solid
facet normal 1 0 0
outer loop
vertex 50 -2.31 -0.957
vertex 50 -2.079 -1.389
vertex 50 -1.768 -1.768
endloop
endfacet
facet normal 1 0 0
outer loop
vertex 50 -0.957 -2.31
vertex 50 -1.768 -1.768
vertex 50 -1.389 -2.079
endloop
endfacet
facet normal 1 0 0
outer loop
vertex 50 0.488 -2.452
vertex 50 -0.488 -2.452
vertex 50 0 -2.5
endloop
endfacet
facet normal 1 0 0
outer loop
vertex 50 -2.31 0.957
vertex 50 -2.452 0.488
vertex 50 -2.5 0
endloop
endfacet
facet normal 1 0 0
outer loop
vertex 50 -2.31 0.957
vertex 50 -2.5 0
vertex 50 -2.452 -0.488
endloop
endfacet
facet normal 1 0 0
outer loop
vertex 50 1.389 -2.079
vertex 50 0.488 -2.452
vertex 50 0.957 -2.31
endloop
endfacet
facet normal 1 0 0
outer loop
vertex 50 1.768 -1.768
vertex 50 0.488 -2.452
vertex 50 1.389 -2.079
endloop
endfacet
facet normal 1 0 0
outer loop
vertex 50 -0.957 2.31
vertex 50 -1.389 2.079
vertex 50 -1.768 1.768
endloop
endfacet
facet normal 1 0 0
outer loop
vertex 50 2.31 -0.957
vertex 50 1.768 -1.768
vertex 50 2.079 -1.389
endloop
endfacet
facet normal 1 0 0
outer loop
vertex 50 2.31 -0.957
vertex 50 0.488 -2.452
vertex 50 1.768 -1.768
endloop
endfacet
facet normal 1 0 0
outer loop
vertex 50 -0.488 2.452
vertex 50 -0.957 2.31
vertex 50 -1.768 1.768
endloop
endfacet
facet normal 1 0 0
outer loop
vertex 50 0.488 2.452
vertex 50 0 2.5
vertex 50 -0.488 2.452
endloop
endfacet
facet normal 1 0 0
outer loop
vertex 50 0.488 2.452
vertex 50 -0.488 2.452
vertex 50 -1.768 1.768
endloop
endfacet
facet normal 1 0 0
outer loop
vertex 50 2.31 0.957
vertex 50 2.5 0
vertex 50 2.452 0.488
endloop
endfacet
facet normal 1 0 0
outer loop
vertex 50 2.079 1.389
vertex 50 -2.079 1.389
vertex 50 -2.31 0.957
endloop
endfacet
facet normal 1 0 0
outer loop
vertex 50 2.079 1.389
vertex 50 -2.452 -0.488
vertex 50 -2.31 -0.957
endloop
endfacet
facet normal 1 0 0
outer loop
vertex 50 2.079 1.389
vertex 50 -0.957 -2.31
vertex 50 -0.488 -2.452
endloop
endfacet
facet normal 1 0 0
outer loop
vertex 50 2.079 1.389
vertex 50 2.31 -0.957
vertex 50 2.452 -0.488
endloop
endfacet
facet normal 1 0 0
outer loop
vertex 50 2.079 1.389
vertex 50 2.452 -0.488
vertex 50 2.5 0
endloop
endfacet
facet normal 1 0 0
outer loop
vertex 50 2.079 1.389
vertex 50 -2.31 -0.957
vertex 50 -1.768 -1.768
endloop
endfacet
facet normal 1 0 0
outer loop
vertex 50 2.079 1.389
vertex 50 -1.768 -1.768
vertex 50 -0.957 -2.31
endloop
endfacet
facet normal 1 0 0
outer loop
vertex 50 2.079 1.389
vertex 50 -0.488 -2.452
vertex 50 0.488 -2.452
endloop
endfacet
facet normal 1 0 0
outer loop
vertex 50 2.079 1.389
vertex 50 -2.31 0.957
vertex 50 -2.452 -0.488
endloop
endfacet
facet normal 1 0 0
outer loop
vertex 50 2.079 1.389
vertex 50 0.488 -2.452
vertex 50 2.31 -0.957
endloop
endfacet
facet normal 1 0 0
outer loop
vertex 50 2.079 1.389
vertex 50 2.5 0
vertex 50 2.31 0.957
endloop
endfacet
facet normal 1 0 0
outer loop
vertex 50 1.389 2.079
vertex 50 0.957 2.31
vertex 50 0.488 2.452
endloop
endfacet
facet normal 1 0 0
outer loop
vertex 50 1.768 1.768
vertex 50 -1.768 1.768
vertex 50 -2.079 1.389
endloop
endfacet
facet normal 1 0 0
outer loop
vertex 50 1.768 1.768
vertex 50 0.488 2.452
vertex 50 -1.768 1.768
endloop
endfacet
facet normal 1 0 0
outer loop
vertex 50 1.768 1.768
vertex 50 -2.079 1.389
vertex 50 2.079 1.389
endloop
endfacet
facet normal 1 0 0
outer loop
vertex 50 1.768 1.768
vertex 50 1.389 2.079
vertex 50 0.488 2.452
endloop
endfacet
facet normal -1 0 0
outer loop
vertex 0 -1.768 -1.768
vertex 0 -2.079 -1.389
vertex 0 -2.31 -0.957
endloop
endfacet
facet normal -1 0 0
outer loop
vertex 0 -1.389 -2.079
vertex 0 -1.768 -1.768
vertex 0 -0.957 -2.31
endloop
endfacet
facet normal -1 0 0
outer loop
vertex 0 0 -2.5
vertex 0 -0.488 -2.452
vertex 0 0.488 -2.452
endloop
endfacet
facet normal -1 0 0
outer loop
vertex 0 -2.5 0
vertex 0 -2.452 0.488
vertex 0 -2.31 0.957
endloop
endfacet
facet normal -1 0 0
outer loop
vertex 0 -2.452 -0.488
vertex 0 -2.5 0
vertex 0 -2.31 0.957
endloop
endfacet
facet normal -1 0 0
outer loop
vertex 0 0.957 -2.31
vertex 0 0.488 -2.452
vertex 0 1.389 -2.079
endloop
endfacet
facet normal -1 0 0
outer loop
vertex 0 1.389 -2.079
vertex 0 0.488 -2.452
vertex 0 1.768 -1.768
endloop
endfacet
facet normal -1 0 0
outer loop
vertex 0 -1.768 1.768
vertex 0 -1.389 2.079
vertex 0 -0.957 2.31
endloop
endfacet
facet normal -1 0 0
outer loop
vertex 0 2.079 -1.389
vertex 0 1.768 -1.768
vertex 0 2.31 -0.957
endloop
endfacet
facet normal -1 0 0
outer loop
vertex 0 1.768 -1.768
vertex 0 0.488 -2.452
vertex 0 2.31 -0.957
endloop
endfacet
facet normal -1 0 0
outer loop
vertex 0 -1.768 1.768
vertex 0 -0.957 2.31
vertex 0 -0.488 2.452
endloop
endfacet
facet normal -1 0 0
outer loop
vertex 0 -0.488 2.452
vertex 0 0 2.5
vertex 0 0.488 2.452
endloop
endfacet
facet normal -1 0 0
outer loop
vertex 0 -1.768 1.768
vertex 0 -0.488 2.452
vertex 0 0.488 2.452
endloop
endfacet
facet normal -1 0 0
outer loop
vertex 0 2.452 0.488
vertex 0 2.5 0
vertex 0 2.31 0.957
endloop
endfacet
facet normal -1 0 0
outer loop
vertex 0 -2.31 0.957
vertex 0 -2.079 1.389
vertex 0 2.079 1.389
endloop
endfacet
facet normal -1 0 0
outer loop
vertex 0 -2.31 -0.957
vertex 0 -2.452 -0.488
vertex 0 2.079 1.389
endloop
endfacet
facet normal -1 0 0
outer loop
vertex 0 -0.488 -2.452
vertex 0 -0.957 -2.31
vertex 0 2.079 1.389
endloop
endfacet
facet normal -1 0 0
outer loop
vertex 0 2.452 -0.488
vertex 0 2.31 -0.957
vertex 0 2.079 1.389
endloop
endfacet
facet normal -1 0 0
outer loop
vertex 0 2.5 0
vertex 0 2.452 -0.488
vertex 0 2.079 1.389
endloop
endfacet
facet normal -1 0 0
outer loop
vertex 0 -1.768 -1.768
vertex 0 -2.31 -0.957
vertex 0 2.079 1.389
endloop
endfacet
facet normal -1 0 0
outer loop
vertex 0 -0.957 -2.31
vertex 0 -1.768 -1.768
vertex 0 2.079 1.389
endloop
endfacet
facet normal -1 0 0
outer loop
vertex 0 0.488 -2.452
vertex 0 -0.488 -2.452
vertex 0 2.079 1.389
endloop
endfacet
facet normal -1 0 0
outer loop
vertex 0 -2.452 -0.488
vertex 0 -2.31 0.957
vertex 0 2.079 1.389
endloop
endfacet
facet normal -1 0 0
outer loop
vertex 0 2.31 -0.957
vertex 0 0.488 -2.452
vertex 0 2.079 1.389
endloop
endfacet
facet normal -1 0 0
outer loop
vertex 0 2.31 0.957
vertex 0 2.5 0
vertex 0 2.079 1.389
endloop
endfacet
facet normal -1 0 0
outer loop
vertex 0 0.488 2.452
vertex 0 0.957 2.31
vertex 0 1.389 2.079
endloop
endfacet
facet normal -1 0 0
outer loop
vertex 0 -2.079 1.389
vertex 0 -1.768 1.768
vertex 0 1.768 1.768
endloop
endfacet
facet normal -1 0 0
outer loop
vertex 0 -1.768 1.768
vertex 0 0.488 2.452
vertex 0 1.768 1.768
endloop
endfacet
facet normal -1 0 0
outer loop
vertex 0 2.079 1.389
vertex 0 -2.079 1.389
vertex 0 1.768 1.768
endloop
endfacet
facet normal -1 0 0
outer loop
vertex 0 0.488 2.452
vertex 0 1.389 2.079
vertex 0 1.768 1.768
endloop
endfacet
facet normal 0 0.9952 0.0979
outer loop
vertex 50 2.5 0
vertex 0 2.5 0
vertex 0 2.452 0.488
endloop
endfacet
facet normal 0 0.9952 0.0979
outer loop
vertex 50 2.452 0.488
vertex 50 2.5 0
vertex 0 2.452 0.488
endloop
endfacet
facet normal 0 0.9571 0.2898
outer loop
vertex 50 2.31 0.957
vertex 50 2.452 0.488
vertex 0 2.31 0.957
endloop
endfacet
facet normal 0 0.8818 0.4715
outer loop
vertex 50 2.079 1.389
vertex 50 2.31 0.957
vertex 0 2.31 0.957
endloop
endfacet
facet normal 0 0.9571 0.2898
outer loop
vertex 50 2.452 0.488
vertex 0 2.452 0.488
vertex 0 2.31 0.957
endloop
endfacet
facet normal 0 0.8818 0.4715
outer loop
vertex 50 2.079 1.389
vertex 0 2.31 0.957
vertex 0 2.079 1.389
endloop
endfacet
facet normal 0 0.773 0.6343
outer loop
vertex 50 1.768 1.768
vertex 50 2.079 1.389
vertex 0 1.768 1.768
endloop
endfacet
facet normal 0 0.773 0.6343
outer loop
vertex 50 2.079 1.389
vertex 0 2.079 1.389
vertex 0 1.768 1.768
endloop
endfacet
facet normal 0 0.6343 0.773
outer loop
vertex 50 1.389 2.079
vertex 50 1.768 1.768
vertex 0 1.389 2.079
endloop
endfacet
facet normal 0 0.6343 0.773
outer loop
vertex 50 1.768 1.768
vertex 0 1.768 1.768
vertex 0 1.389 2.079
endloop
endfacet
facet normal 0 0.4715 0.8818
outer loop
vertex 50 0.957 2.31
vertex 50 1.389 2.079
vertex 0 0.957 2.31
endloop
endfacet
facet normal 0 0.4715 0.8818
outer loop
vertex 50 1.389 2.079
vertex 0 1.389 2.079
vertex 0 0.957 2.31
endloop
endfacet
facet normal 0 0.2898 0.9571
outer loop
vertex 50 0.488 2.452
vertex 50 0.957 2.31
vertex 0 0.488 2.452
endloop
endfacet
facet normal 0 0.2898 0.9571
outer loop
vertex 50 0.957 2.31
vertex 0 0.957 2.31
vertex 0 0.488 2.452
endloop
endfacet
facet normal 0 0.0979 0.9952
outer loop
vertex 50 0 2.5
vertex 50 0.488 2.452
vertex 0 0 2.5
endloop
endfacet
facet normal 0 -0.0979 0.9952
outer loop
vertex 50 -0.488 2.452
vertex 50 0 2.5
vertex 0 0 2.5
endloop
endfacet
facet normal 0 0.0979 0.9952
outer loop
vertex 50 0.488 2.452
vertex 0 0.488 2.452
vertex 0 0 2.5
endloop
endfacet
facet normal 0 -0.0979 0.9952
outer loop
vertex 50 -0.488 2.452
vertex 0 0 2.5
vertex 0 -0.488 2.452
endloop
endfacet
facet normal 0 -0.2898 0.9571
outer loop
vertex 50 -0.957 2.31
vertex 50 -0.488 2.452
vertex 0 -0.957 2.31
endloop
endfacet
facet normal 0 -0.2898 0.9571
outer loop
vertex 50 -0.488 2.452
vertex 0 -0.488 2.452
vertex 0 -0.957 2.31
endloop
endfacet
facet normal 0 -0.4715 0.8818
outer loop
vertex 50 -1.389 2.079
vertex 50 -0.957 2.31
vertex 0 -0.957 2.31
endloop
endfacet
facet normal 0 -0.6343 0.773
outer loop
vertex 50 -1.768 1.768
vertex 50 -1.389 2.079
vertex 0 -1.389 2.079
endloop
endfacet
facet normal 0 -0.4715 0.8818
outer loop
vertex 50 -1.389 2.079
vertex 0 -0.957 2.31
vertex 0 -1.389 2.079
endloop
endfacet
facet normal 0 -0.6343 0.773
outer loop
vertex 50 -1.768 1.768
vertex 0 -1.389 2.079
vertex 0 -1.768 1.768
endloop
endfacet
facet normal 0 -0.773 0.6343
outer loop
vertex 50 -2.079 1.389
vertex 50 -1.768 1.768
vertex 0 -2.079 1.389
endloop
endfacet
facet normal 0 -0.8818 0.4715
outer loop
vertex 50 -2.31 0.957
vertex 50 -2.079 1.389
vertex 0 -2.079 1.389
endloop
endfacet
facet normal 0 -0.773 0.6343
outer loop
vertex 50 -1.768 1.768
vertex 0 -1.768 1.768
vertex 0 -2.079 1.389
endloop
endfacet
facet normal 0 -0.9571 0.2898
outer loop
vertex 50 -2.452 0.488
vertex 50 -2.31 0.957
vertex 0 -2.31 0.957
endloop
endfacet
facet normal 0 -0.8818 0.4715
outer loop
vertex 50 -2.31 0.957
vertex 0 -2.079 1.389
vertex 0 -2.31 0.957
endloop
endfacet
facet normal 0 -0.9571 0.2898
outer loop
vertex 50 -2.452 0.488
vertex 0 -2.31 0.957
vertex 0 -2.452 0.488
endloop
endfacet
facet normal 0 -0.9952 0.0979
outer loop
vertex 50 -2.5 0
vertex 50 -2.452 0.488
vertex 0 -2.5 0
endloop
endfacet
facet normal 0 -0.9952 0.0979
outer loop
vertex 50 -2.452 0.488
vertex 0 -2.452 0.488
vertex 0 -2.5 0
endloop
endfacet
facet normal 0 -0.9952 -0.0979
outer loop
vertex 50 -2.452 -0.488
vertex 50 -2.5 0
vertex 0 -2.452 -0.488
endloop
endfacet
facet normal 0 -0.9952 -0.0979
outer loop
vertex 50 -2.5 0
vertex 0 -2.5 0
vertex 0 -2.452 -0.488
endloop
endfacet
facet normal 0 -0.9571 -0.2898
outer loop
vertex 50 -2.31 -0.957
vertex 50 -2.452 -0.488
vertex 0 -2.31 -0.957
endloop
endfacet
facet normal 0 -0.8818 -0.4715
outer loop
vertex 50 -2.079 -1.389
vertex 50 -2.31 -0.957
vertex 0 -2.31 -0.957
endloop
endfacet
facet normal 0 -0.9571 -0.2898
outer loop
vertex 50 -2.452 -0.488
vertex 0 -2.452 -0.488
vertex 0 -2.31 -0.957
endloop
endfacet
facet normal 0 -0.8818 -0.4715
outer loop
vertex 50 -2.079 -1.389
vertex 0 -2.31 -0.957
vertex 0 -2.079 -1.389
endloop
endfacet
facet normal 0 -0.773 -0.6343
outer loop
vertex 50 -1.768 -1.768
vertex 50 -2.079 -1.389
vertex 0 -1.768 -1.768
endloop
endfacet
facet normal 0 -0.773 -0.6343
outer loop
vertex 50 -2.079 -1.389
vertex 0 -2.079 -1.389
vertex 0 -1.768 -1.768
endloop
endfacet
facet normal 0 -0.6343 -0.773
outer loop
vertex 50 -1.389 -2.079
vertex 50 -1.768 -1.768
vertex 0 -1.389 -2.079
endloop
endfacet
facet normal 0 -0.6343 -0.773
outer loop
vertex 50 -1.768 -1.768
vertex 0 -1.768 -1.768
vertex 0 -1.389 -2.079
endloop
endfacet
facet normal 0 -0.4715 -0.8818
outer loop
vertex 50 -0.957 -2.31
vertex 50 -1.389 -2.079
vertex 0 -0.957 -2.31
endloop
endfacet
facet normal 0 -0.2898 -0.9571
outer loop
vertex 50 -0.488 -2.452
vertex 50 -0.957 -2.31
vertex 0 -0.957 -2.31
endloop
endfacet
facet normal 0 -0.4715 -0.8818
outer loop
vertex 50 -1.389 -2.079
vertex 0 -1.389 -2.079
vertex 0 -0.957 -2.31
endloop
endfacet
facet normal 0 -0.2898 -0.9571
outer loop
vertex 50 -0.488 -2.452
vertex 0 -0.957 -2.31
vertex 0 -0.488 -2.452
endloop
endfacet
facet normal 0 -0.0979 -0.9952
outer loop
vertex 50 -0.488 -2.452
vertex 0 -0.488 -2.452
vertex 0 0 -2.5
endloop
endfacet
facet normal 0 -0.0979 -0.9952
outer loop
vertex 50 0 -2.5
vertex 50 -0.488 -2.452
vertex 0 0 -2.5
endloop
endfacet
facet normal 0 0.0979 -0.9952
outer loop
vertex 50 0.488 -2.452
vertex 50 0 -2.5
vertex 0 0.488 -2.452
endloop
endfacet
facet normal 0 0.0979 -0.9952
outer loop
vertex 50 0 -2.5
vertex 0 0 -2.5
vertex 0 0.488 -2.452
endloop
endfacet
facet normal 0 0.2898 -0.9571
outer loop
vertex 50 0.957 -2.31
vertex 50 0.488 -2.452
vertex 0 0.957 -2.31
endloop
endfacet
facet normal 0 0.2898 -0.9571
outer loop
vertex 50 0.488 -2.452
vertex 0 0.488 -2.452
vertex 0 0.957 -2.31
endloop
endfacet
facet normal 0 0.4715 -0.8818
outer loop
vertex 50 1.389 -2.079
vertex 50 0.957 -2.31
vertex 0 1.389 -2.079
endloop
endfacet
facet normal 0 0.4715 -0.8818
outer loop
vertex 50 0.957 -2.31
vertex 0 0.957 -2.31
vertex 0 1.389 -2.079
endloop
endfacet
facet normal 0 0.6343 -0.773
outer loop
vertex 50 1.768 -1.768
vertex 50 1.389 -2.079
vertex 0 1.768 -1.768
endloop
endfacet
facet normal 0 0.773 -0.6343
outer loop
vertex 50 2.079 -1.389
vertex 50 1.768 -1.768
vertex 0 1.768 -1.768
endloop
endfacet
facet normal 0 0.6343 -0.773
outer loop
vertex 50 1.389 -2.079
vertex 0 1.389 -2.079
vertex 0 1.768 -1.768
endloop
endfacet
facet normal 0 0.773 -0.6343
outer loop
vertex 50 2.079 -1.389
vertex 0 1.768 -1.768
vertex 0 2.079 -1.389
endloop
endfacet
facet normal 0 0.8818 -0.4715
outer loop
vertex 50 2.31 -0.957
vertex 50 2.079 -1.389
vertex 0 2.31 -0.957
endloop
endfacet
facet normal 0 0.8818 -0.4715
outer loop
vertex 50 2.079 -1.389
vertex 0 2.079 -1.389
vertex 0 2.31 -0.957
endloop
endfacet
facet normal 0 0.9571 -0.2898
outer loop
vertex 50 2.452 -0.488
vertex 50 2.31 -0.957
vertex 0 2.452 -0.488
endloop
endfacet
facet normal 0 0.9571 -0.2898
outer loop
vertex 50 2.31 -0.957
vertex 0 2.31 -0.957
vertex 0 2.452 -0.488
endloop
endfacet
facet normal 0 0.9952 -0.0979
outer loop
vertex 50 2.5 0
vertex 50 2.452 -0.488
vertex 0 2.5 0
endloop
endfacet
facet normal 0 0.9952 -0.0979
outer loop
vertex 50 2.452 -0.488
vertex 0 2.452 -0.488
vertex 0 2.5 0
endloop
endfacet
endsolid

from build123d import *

# Parameters (mm, degrees)
F1_R     = 2.5
F2_DEPTH = 50


with BuildPart() as f2:
    # F1 (on Right) → F2 (new body)
    with BuildSketch(Plane.YZ):
        Circle(F1_R)
    extrude(amount=F2_DEPTH)


with BuildPart() as f3_1:
    # F3: copy of F2
    add(f2.part)


solid = f3_1.part
